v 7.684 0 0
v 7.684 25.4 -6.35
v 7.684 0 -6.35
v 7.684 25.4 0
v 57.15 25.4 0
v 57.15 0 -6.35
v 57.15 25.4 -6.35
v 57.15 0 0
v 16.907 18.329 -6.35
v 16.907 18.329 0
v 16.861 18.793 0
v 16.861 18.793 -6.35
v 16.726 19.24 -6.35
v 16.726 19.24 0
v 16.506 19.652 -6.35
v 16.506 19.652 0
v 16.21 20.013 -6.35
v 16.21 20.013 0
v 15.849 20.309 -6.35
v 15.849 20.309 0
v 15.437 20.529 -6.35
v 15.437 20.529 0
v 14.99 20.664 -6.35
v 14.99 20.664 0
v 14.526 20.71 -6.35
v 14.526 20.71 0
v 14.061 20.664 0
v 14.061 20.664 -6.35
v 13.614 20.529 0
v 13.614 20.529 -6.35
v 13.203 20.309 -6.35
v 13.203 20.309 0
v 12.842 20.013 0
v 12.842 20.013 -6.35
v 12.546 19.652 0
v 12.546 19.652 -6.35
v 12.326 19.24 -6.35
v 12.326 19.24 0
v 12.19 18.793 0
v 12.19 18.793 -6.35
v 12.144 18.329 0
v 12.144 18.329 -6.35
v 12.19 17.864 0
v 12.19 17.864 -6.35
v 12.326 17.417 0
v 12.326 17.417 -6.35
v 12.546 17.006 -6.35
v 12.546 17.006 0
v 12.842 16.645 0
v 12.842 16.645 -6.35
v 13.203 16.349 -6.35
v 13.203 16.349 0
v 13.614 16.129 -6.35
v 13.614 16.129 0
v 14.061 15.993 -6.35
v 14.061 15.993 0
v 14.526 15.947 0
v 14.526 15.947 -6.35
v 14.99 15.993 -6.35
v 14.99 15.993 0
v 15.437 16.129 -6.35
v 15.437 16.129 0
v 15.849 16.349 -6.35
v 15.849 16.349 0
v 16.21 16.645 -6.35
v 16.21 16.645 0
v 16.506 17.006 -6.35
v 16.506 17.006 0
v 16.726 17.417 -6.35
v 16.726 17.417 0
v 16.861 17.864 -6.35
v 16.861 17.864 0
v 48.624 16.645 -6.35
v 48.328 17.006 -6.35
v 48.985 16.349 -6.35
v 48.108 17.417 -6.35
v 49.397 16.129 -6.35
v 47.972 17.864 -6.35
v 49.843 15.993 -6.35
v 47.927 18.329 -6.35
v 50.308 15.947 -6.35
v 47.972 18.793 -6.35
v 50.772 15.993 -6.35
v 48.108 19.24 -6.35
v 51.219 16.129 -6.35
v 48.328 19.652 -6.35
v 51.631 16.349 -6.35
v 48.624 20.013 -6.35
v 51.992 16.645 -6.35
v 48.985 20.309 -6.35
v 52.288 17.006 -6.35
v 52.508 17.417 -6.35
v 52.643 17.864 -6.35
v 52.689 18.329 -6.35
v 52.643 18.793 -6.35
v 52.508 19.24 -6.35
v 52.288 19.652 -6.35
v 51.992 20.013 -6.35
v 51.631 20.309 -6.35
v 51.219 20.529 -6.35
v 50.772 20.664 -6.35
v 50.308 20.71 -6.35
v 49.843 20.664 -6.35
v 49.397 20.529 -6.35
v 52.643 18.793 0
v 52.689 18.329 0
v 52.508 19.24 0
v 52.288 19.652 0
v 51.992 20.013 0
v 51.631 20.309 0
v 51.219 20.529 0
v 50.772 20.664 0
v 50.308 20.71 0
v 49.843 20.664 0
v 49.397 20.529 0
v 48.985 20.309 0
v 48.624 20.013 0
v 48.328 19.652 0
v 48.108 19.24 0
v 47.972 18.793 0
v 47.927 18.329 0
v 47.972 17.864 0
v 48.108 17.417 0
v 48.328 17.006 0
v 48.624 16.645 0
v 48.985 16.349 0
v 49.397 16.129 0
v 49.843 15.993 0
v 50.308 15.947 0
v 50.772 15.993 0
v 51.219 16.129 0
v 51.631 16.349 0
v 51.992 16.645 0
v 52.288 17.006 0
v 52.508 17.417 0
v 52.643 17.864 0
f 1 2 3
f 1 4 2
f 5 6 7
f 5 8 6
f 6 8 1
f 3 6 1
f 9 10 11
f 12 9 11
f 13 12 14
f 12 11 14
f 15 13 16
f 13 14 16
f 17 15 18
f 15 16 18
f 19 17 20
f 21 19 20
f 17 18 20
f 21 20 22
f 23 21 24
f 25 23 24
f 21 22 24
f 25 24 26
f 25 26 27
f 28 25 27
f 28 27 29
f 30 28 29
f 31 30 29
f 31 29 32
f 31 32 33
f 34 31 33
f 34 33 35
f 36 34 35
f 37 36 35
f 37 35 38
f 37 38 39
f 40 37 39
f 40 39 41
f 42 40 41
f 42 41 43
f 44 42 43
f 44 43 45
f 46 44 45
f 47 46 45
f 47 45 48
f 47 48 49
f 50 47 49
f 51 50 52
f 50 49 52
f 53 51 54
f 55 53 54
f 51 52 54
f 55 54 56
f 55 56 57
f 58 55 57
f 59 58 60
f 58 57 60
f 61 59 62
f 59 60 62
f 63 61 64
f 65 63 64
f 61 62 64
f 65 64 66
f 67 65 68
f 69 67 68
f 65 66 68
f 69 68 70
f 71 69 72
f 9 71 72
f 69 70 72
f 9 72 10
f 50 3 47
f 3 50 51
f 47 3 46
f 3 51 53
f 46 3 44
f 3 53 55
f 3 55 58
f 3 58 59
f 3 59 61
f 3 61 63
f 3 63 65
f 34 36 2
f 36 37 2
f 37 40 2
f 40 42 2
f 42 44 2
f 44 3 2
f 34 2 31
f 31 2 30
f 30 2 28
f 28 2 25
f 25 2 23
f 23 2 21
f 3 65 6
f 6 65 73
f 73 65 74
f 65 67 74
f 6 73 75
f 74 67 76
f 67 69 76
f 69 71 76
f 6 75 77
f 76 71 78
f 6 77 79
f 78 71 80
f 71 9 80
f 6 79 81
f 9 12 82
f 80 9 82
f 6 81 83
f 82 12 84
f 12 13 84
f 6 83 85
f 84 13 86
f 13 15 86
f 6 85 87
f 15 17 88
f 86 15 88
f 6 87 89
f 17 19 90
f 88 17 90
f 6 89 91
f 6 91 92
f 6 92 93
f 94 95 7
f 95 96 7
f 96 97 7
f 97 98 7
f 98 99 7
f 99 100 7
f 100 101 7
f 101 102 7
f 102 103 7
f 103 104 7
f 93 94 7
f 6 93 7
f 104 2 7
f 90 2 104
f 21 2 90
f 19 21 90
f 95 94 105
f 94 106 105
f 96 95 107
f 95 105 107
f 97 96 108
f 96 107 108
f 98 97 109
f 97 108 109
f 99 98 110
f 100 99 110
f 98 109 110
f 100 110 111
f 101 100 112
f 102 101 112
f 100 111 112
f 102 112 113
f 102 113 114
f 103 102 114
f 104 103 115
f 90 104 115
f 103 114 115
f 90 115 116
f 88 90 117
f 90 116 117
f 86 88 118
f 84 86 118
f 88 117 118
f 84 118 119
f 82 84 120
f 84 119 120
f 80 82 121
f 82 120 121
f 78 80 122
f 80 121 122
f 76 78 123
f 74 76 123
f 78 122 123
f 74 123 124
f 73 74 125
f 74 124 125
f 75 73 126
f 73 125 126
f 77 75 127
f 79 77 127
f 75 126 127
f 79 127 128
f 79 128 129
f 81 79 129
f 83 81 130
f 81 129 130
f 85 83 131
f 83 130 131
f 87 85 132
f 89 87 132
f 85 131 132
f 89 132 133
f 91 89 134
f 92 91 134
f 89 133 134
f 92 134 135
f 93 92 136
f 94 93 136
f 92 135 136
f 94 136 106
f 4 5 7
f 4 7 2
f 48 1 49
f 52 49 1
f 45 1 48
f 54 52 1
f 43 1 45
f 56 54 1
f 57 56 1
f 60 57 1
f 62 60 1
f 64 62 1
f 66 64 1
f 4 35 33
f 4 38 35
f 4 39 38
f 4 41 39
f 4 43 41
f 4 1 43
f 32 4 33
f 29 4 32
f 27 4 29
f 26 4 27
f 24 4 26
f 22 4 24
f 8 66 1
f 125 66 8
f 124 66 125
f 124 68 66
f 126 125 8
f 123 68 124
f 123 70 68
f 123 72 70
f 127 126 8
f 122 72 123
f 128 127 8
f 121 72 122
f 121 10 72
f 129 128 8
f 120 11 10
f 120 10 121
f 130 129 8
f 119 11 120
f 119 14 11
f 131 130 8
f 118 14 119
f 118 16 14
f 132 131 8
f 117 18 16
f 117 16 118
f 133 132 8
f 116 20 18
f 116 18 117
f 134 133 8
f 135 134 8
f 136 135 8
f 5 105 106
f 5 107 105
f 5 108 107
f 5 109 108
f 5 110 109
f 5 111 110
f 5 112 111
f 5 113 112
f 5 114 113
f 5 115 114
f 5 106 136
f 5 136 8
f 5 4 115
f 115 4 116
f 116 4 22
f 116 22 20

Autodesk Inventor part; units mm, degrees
ref_plane "YZ Plane" through (0, 0, 0) normal (1, 0, 0) x (0, 1, 0)
ref_plane "XZ Plane" through (0, 0, 0) normal (0, 1, 0) x (-1, 0, 0)
ref_plane "XY Plane" through (0, 0, 0) normal (0, 0, 1) x (1, 0, 0)
ref_plane "Work Plane1" through (0, 0, 0) normal (0, 0, 1) x (1, 0, 0)
sketch "Sketch1" plane through (0, 0, 0) normal (0, 0, 1) x (1, 0, 0)
  line L0 (-17.7099, -6.35) -> (57.15, -6.35) projected
  line L1 (57.15, 0) -> (-17.7099, 0) projected
  line L2 (1.3284, -28.575) -> (1.3284, 22.225) projected
  line L3 (1.3284, -28.575) -> (7.6784, -28.575) projected
  line L4 (7.6784, 22.225) -> (7.6784, -28.575) projected
  line L5 (1.3284, 22.225) -> (7.6784, 22.225) projected
  line L6 (63.5, -28.575) -> (63.5, 22.225) projected
  line L7 (63.5, 22.225) -> (57.15, 22.225) projected
  line L8 (57.15, -28.575) -> (57.15, 22.225) projected
  line L9 (63.5, -28.575) -> (57.15, -28.575) projected
  line L10 (7.6835, 0) -> (57.15, 0)
  line L11 (57.15, 0) -> (57.15, 25.4)
  line L12 (57.15, 25.4) -> (7.6835, 25.4)
  line L13 (7.6835, 25.4) -> (7.6835, 0)
  circle A0 centre (14.5257, 3.9217) radius 2.3813
  line L14 (32.4168, 24.8107) -> (32.4168, 0) construction
  circle A1 centre (50.3079, 3.9217) radius 2.3813
  line L15 (7.6835, 11.1252) -> (57.15, 11.1252) construction
  circle A2 centre (14.5257, 18.3287) radius 2.3813
  circle A3 centre (50.3079, 18.3287) radius 2.3813
  line L16 (57.15, 0) -> (57.15, -6.35) projected
  line L17 (-17.7099, 0) -> (-17.7099, -6.35) projected
  line L18 (57.15, 0) -> (63.5, 0) projected
  point P0 (0, 0)
  dimension "d0" = 4.7625
  dimension "d3" = 25.4
  dimension "d4" = 11.1252
extrude "Extrusion1" add sketch "Sketch1" against normal blind 6.35 contours L1 L13 L12 L11 L8 | A0 | A1
properties part number "basePlate01"
